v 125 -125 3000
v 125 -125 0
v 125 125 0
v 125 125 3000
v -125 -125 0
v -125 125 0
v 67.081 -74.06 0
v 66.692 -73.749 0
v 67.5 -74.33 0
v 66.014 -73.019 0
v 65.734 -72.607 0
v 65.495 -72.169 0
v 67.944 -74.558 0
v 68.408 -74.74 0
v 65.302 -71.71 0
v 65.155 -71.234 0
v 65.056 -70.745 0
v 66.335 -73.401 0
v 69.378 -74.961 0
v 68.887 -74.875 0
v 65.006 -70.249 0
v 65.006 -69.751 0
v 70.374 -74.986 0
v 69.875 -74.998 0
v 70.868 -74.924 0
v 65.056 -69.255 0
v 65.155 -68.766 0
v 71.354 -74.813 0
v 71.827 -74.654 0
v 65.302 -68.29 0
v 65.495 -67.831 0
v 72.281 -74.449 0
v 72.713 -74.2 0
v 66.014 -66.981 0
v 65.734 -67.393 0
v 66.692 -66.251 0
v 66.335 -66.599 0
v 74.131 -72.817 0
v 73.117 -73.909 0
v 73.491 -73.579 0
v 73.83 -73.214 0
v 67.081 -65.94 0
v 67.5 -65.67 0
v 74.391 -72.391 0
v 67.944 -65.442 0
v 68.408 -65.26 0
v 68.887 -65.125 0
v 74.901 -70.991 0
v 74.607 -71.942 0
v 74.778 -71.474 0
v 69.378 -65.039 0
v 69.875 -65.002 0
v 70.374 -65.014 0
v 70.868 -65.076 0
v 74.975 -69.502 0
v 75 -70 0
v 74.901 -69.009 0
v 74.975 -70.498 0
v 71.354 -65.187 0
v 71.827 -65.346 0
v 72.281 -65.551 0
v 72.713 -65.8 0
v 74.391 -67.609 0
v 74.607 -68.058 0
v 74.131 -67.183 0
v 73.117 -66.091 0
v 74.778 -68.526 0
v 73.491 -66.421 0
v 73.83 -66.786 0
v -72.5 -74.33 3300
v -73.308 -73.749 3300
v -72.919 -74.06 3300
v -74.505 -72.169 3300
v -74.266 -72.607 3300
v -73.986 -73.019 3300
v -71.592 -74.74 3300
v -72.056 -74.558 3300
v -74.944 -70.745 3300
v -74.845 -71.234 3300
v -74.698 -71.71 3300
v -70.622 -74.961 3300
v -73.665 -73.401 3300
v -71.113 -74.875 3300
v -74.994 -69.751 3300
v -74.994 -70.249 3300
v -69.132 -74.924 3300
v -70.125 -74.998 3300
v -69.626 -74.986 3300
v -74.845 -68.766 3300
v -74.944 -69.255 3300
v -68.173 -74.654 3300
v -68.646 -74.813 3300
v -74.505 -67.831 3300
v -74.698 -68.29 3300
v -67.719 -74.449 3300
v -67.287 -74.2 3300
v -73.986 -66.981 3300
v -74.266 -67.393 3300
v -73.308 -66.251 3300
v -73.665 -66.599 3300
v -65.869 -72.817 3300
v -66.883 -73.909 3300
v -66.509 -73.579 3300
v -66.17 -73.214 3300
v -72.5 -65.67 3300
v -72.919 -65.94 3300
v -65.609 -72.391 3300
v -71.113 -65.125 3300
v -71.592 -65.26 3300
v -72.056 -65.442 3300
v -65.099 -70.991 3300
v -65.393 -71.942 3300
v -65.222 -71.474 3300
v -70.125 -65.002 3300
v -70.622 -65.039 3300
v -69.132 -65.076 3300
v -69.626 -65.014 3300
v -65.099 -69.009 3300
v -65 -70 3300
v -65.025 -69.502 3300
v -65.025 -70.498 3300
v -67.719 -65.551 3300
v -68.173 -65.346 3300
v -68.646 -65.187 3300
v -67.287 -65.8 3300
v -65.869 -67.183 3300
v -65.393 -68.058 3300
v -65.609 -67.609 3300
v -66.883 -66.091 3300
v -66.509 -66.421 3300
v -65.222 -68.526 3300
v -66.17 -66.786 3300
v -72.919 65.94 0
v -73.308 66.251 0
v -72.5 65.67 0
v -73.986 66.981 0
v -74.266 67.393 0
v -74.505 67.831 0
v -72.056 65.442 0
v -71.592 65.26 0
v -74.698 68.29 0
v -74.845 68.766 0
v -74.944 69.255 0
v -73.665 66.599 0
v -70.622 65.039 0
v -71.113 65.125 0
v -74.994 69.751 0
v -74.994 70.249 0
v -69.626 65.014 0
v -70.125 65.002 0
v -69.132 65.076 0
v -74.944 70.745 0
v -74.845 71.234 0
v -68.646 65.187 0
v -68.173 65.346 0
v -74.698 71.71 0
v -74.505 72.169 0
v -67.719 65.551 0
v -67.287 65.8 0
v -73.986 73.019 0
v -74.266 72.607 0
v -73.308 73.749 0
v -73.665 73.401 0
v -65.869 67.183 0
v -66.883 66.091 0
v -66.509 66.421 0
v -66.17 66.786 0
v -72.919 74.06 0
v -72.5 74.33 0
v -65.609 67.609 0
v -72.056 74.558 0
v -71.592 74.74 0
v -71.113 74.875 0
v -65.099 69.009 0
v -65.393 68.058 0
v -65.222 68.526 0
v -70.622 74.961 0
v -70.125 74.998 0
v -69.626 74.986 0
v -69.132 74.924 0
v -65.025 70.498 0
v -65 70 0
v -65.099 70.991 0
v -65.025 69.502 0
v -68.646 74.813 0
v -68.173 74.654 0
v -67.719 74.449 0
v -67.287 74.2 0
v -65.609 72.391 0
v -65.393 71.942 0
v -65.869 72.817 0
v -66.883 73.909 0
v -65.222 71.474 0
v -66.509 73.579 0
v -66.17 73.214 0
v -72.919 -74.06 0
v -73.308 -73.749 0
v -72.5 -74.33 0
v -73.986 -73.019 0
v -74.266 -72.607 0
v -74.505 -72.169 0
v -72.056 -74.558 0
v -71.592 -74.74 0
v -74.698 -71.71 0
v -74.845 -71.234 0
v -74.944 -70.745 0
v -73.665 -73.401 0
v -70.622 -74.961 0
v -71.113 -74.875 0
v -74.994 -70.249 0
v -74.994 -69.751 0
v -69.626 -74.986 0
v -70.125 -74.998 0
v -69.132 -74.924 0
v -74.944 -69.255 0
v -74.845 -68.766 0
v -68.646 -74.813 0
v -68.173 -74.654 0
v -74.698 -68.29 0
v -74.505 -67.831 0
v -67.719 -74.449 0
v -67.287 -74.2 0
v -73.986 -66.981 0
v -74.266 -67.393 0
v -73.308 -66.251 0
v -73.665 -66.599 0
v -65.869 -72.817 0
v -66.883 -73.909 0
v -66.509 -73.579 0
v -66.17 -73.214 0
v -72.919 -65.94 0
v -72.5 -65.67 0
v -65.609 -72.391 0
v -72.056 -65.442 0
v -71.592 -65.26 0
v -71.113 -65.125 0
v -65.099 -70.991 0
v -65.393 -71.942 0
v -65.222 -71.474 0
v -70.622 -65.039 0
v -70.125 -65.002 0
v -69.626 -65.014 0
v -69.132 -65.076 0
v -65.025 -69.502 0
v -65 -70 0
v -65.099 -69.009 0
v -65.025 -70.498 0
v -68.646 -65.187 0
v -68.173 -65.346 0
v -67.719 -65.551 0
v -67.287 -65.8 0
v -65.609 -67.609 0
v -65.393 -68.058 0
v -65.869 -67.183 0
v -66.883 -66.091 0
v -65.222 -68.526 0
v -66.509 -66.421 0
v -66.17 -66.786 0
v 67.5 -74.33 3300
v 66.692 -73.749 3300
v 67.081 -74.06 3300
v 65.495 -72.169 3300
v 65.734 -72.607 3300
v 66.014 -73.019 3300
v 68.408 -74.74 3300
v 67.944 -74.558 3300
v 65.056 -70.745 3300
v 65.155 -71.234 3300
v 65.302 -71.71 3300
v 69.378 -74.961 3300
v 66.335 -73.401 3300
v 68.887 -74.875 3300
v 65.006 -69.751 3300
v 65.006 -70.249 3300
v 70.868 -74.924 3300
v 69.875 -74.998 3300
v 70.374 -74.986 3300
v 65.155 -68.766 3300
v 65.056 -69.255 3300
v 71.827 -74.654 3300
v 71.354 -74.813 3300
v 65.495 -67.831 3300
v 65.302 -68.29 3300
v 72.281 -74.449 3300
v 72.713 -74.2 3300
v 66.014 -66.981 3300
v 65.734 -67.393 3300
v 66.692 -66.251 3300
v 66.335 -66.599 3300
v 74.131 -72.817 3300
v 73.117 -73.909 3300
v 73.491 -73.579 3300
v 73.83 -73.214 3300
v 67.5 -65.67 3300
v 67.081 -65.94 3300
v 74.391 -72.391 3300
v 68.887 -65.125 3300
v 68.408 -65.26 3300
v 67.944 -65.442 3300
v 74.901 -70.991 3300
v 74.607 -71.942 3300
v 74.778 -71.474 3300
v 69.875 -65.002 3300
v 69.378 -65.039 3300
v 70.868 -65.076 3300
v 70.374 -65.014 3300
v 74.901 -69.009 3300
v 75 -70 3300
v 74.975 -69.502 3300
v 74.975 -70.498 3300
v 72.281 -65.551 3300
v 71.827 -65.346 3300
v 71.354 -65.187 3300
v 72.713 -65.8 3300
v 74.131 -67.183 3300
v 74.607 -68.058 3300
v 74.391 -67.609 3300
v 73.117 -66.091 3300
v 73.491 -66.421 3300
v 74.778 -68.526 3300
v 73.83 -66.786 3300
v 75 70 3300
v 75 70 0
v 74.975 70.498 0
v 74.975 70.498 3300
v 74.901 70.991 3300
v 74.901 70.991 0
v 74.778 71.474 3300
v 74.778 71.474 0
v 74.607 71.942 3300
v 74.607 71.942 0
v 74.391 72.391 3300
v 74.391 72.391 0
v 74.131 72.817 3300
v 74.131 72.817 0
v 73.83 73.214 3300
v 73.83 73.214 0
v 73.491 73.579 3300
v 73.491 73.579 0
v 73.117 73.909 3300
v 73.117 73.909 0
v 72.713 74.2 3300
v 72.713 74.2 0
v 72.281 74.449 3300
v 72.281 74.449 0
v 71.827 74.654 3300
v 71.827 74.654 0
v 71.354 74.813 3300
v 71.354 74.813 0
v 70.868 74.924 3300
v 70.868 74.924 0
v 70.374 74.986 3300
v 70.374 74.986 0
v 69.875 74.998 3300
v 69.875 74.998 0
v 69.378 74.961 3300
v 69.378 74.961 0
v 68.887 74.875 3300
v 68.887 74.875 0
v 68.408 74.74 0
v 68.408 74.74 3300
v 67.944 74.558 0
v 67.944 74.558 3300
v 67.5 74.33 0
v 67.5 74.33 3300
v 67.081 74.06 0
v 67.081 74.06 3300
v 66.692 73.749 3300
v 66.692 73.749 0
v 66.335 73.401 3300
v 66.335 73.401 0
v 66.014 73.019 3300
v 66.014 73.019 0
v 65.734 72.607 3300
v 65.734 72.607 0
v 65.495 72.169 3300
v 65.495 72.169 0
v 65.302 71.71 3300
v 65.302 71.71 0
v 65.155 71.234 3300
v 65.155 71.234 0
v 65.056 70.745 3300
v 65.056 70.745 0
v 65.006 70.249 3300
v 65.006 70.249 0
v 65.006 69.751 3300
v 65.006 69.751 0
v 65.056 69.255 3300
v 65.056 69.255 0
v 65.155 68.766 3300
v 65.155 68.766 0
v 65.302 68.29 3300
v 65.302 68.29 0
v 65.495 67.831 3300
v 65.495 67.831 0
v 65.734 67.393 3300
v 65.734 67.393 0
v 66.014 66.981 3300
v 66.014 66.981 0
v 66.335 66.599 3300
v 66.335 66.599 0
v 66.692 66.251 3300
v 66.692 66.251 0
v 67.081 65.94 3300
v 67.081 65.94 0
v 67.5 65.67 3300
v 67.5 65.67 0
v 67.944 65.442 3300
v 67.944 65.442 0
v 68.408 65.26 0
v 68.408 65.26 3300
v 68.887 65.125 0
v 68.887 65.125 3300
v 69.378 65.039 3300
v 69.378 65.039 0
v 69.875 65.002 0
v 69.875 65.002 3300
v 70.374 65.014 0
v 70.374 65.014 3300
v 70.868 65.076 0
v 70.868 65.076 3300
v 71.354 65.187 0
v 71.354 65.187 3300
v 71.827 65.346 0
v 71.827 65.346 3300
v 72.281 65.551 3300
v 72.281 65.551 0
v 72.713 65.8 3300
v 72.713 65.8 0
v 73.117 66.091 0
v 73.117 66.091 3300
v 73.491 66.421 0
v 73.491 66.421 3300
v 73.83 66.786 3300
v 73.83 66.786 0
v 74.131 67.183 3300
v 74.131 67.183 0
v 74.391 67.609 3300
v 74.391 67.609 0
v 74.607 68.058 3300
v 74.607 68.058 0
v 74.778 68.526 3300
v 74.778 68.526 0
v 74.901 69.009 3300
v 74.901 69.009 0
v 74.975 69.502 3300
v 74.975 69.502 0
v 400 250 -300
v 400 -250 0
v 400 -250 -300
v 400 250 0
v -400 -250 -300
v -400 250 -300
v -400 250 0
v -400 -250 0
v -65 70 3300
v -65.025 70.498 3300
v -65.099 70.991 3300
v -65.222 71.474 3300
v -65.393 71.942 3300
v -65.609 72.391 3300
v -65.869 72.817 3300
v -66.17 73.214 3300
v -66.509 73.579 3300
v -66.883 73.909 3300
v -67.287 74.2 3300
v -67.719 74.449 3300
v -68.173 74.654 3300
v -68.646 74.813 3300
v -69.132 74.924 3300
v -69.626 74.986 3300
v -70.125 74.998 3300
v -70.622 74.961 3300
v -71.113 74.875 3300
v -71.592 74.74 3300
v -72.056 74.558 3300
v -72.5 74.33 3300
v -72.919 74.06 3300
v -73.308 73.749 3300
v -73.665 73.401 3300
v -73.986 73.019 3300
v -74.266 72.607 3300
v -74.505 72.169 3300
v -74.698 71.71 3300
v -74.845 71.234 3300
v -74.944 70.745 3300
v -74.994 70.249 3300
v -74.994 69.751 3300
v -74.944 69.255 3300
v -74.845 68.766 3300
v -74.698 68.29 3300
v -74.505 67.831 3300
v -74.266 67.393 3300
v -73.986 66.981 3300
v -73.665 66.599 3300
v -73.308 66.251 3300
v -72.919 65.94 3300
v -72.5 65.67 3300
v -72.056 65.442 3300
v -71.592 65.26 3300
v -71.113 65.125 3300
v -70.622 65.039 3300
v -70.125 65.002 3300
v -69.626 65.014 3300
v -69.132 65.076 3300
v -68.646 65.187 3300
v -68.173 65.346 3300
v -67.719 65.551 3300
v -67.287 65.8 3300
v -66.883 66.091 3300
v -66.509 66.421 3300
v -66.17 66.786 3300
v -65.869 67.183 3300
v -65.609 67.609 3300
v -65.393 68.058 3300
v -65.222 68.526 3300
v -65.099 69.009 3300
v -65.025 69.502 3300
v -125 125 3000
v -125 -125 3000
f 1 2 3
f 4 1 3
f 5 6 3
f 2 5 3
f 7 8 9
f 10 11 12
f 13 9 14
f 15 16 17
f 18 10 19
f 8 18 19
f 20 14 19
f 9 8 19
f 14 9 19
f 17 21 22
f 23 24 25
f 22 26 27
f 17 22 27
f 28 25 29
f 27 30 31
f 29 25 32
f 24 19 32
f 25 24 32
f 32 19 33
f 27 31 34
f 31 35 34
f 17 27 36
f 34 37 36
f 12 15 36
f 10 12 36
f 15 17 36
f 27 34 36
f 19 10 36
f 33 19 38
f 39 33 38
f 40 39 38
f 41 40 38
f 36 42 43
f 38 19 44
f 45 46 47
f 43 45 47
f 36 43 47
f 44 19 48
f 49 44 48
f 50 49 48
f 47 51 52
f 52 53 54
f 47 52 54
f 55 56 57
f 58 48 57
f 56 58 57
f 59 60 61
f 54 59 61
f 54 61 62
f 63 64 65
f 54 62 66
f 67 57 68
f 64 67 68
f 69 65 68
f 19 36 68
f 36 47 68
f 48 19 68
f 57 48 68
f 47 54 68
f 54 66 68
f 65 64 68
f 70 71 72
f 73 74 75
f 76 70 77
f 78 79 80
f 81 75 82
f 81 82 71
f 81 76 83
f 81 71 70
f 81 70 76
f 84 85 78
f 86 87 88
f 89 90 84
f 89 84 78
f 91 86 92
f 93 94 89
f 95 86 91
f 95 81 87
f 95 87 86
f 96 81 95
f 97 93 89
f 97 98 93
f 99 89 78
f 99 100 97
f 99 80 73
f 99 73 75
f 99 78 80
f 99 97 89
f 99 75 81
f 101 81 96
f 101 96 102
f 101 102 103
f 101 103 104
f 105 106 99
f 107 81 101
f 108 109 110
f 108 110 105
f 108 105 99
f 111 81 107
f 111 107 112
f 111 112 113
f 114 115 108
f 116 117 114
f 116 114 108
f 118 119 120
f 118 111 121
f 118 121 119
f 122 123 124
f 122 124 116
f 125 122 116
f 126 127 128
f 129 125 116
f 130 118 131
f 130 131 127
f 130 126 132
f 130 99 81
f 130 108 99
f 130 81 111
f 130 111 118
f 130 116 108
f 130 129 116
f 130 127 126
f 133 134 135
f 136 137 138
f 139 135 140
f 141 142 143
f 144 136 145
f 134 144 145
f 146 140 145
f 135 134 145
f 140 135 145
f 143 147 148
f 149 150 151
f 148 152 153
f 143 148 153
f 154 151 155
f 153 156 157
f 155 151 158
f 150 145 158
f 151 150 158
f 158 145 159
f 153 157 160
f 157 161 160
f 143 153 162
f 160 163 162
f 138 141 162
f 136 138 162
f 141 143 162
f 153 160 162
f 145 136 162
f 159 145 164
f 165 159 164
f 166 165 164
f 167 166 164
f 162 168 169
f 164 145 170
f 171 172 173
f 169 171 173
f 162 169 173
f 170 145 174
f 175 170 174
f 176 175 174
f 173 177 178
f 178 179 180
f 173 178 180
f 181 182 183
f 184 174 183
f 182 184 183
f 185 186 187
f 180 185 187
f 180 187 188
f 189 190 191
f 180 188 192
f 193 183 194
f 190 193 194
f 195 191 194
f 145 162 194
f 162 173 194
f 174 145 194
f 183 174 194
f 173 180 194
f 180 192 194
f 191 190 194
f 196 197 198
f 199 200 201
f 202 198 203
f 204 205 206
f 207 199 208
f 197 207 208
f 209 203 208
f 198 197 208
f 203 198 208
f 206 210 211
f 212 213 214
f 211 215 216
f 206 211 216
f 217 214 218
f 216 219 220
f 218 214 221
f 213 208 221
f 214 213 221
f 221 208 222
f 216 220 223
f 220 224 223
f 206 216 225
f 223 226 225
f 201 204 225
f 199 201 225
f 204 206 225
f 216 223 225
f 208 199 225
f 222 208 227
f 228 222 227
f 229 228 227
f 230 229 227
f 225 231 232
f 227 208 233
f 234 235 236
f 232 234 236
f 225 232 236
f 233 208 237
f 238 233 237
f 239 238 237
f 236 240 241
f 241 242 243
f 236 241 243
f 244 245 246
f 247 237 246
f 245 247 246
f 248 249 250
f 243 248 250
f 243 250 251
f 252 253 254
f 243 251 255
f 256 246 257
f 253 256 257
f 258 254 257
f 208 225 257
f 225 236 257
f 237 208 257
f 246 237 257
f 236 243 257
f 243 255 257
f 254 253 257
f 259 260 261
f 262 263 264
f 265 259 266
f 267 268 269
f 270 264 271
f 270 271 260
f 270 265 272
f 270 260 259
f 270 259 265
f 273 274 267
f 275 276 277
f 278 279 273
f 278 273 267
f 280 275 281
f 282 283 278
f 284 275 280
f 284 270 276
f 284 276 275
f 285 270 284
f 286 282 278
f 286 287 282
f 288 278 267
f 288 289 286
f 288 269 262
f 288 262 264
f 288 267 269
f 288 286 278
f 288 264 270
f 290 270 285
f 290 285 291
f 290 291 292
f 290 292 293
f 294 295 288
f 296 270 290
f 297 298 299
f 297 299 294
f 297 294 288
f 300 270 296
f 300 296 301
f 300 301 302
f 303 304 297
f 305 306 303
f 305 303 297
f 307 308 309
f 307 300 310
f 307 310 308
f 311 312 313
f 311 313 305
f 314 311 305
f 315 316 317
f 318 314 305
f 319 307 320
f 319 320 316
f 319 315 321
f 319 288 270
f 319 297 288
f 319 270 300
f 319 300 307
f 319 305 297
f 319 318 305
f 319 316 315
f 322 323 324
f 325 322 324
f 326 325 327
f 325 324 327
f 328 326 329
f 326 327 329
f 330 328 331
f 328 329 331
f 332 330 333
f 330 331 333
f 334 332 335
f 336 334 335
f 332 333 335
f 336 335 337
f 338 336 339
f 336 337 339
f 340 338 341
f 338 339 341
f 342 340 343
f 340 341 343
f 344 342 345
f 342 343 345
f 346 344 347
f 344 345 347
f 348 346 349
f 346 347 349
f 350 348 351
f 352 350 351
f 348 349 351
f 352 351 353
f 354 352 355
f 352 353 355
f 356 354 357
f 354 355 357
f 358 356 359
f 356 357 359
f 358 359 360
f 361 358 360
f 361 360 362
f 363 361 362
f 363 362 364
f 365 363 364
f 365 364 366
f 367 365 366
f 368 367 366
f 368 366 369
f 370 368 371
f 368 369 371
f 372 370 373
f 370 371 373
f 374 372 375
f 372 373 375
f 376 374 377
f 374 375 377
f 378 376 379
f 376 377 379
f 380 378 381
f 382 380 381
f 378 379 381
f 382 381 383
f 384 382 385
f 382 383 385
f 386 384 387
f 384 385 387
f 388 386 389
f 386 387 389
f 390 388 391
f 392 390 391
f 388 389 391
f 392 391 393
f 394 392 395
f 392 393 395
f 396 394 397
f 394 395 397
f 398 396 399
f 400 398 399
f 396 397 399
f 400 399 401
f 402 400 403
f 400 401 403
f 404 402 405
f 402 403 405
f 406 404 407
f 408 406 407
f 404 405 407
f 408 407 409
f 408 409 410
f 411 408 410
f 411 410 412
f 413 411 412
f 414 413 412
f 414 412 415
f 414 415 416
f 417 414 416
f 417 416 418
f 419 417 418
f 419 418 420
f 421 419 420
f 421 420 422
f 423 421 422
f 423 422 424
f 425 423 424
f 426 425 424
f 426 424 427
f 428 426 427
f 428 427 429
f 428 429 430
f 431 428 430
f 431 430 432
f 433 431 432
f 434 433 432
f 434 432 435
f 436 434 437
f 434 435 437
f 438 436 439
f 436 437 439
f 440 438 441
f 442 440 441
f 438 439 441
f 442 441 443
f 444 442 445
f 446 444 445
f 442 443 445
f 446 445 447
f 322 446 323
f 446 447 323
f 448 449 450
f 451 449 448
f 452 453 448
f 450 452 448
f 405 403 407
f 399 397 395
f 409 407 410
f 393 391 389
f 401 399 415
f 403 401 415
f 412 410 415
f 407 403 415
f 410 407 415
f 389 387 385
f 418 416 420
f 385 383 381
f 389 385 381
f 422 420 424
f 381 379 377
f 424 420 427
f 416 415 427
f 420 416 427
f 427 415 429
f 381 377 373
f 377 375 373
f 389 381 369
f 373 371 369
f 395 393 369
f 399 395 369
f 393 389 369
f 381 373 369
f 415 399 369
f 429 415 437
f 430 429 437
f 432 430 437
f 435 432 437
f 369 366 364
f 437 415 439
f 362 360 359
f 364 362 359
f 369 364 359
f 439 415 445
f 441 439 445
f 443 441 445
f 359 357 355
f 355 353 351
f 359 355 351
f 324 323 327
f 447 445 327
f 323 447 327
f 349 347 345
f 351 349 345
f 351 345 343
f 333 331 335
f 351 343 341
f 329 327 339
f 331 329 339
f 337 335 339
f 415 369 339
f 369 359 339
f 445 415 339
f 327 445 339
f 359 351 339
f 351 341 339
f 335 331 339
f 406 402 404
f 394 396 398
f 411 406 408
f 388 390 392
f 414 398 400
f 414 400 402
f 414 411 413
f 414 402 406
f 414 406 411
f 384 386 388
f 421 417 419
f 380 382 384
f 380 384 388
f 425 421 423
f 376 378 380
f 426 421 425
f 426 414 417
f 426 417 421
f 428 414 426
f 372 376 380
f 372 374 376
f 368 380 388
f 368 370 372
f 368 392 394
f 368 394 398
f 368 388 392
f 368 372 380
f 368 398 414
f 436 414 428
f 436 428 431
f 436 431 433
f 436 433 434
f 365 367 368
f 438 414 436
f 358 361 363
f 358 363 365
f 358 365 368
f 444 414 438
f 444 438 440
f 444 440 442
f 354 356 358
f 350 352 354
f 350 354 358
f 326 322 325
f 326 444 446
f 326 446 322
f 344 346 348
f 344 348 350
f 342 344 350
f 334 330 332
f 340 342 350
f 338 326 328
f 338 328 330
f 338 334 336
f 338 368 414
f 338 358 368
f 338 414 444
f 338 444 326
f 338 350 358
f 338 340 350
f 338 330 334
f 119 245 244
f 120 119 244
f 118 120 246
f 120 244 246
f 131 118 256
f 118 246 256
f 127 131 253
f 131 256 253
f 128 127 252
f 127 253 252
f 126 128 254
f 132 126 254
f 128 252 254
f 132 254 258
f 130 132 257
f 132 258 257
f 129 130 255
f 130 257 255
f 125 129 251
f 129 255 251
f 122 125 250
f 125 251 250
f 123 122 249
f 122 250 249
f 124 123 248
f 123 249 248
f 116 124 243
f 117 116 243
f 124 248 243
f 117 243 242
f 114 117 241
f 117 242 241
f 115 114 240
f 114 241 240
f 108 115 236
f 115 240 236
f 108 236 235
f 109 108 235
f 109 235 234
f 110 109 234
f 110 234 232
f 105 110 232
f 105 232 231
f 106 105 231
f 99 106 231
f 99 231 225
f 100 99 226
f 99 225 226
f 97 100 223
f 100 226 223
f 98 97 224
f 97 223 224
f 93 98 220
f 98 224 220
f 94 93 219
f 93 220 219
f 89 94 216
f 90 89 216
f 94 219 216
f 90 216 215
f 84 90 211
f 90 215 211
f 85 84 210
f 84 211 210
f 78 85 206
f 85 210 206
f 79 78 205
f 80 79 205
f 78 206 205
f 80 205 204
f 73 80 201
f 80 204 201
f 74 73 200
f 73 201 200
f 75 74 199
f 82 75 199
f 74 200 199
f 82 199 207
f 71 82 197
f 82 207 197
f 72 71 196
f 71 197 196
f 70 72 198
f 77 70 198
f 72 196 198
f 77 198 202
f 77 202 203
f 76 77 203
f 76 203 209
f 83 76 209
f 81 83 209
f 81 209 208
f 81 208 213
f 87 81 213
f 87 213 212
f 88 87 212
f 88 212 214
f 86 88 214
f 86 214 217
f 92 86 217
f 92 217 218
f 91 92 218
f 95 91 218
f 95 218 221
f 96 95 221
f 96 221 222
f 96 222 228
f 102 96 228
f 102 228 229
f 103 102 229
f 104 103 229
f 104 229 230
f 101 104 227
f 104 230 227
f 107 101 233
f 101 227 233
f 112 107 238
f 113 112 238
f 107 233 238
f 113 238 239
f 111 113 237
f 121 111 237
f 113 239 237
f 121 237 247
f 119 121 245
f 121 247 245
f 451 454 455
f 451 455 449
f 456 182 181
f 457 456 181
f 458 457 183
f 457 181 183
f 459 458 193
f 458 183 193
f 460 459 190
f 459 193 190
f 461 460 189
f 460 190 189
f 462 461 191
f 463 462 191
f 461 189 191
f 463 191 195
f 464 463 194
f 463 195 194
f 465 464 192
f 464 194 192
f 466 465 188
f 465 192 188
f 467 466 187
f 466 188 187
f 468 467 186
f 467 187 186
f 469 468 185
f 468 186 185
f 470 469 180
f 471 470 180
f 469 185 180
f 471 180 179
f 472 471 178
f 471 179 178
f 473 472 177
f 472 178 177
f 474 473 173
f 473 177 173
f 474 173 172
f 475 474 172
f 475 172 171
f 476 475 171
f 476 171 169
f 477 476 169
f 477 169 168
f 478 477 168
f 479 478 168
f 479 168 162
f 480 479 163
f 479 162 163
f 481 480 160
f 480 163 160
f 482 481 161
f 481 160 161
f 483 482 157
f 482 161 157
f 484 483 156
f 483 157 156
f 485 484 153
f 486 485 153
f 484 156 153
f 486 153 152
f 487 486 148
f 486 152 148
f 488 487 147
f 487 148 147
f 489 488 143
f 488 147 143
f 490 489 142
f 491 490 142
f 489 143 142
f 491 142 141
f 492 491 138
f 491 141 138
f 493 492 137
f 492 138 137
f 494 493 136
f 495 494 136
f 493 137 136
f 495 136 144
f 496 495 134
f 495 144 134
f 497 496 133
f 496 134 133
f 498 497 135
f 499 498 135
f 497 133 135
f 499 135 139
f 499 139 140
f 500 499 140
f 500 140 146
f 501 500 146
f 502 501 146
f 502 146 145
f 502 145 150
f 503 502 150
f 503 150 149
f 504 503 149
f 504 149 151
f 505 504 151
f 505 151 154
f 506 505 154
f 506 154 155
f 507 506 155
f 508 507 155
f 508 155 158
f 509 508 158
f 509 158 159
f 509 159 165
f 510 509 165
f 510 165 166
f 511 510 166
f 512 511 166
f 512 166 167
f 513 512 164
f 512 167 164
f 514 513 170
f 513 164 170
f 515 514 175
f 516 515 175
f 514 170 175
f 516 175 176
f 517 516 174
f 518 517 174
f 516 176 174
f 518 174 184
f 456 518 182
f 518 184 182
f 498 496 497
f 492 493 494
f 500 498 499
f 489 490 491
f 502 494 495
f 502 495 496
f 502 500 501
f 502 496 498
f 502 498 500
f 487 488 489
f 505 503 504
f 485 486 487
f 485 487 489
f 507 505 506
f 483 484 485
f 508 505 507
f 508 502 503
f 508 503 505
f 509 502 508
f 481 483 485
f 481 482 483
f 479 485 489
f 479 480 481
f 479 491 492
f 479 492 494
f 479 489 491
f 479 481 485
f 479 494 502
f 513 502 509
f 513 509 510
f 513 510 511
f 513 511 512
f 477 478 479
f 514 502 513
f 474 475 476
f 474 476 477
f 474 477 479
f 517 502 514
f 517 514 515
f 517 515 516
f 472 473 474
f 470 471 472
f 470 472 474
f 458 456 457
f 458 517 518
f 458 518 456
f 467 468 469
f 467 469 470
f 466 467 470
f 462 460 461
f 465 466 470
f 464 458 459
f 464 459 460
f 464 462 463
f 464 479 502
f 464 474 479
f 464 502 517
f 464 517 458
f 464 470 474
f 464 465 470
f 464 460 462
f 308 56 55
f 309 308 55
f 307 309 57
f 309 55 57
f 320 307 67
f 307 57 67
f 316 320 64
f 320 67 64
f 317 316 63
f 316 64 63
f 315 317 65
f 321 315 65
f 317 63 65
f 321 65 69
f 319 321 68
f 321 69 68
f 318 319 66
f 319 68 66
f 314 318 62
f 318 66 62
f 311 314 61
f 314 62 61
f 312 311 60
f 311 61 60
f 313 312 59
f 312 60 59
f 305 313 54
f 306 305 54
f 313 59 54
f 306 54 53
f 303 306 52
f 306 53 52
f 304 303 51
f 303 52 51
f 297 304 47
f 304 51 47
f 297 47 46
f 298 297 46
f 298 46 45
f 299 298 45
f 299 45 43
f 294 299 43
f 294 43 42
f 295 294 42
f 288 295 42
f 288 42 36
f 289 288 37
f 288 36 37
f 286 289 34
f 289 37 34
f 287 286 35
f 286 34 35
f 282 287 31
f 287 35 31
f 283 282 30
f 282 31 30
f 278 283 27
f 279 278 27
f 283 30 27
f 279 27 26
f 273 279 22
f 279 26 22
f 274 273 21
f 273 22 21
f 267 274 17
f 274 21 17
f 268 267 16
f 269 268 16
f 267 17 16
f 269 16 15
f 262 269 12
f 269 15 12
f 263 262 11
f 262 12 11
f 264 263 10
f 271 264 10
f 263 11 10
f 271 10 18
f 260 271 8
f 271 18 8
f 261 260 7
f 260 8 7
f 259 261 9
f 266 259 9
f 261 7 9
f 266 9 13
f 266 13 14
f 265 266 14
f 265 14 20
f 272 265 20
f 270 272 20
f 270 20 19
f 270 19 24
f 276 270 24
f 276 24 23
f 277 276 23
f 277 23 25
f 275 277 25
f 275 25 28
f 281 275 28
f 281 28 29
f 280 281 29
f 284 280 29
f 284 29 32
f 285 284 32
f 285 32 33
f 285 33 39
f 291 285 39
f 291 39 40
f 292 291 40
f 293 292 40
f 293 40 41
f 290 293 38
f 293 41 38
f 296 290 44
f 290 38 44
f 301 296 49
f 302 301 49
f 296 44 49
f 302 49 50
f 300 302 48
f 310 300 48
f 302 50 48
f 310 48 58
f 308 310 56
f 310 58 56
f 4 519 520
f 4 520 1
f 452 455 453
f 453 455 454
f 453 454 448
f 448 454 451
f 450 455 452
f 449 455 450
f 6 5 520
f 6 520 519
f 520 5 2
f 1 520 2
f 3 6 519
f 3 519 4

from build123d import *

# Parameters (mm, degrees)
F0_W     = 250
F0_H     = 250
F1_DEPTH = 3000
F2_R     = 5
F3_DEPTH = 3300
F4_W     = 800
F4_H     = 500
F5_DEPTH = 300


with BuildPart() as f1:
    # F0 (on Top) → F1 (new body)
    with BuildSketch(Plane.XY):
        Rectangle(F0_W, F0_H)
    extrude(amount=F1_DEPTH)


with BuildPart() as f3:
    # F2 (on Top) → F3 (new body)
    with BuildSketch(Plane.XY):
        with Locations((70, -70)):
            Circle(F2_R)
        with Locations((70, 70)):
            Circle(F2_R)
        with Locations((-70, 70)):
            Circle(F2_R)
        with Locations((-70, -70)):
            Circle(F2_R)
    extrude(amount=F3_DEPTH)


with BuildPart() as f5:
    # F4 (on Top) → F5 (new body)
    with BuildSketch(Plane.XY):
        Rectangle(F4_W, F4_H)
    extrude(amount=-F5_DEPTH)


solid = Compound([f1.part, f3.part, f5.part])
